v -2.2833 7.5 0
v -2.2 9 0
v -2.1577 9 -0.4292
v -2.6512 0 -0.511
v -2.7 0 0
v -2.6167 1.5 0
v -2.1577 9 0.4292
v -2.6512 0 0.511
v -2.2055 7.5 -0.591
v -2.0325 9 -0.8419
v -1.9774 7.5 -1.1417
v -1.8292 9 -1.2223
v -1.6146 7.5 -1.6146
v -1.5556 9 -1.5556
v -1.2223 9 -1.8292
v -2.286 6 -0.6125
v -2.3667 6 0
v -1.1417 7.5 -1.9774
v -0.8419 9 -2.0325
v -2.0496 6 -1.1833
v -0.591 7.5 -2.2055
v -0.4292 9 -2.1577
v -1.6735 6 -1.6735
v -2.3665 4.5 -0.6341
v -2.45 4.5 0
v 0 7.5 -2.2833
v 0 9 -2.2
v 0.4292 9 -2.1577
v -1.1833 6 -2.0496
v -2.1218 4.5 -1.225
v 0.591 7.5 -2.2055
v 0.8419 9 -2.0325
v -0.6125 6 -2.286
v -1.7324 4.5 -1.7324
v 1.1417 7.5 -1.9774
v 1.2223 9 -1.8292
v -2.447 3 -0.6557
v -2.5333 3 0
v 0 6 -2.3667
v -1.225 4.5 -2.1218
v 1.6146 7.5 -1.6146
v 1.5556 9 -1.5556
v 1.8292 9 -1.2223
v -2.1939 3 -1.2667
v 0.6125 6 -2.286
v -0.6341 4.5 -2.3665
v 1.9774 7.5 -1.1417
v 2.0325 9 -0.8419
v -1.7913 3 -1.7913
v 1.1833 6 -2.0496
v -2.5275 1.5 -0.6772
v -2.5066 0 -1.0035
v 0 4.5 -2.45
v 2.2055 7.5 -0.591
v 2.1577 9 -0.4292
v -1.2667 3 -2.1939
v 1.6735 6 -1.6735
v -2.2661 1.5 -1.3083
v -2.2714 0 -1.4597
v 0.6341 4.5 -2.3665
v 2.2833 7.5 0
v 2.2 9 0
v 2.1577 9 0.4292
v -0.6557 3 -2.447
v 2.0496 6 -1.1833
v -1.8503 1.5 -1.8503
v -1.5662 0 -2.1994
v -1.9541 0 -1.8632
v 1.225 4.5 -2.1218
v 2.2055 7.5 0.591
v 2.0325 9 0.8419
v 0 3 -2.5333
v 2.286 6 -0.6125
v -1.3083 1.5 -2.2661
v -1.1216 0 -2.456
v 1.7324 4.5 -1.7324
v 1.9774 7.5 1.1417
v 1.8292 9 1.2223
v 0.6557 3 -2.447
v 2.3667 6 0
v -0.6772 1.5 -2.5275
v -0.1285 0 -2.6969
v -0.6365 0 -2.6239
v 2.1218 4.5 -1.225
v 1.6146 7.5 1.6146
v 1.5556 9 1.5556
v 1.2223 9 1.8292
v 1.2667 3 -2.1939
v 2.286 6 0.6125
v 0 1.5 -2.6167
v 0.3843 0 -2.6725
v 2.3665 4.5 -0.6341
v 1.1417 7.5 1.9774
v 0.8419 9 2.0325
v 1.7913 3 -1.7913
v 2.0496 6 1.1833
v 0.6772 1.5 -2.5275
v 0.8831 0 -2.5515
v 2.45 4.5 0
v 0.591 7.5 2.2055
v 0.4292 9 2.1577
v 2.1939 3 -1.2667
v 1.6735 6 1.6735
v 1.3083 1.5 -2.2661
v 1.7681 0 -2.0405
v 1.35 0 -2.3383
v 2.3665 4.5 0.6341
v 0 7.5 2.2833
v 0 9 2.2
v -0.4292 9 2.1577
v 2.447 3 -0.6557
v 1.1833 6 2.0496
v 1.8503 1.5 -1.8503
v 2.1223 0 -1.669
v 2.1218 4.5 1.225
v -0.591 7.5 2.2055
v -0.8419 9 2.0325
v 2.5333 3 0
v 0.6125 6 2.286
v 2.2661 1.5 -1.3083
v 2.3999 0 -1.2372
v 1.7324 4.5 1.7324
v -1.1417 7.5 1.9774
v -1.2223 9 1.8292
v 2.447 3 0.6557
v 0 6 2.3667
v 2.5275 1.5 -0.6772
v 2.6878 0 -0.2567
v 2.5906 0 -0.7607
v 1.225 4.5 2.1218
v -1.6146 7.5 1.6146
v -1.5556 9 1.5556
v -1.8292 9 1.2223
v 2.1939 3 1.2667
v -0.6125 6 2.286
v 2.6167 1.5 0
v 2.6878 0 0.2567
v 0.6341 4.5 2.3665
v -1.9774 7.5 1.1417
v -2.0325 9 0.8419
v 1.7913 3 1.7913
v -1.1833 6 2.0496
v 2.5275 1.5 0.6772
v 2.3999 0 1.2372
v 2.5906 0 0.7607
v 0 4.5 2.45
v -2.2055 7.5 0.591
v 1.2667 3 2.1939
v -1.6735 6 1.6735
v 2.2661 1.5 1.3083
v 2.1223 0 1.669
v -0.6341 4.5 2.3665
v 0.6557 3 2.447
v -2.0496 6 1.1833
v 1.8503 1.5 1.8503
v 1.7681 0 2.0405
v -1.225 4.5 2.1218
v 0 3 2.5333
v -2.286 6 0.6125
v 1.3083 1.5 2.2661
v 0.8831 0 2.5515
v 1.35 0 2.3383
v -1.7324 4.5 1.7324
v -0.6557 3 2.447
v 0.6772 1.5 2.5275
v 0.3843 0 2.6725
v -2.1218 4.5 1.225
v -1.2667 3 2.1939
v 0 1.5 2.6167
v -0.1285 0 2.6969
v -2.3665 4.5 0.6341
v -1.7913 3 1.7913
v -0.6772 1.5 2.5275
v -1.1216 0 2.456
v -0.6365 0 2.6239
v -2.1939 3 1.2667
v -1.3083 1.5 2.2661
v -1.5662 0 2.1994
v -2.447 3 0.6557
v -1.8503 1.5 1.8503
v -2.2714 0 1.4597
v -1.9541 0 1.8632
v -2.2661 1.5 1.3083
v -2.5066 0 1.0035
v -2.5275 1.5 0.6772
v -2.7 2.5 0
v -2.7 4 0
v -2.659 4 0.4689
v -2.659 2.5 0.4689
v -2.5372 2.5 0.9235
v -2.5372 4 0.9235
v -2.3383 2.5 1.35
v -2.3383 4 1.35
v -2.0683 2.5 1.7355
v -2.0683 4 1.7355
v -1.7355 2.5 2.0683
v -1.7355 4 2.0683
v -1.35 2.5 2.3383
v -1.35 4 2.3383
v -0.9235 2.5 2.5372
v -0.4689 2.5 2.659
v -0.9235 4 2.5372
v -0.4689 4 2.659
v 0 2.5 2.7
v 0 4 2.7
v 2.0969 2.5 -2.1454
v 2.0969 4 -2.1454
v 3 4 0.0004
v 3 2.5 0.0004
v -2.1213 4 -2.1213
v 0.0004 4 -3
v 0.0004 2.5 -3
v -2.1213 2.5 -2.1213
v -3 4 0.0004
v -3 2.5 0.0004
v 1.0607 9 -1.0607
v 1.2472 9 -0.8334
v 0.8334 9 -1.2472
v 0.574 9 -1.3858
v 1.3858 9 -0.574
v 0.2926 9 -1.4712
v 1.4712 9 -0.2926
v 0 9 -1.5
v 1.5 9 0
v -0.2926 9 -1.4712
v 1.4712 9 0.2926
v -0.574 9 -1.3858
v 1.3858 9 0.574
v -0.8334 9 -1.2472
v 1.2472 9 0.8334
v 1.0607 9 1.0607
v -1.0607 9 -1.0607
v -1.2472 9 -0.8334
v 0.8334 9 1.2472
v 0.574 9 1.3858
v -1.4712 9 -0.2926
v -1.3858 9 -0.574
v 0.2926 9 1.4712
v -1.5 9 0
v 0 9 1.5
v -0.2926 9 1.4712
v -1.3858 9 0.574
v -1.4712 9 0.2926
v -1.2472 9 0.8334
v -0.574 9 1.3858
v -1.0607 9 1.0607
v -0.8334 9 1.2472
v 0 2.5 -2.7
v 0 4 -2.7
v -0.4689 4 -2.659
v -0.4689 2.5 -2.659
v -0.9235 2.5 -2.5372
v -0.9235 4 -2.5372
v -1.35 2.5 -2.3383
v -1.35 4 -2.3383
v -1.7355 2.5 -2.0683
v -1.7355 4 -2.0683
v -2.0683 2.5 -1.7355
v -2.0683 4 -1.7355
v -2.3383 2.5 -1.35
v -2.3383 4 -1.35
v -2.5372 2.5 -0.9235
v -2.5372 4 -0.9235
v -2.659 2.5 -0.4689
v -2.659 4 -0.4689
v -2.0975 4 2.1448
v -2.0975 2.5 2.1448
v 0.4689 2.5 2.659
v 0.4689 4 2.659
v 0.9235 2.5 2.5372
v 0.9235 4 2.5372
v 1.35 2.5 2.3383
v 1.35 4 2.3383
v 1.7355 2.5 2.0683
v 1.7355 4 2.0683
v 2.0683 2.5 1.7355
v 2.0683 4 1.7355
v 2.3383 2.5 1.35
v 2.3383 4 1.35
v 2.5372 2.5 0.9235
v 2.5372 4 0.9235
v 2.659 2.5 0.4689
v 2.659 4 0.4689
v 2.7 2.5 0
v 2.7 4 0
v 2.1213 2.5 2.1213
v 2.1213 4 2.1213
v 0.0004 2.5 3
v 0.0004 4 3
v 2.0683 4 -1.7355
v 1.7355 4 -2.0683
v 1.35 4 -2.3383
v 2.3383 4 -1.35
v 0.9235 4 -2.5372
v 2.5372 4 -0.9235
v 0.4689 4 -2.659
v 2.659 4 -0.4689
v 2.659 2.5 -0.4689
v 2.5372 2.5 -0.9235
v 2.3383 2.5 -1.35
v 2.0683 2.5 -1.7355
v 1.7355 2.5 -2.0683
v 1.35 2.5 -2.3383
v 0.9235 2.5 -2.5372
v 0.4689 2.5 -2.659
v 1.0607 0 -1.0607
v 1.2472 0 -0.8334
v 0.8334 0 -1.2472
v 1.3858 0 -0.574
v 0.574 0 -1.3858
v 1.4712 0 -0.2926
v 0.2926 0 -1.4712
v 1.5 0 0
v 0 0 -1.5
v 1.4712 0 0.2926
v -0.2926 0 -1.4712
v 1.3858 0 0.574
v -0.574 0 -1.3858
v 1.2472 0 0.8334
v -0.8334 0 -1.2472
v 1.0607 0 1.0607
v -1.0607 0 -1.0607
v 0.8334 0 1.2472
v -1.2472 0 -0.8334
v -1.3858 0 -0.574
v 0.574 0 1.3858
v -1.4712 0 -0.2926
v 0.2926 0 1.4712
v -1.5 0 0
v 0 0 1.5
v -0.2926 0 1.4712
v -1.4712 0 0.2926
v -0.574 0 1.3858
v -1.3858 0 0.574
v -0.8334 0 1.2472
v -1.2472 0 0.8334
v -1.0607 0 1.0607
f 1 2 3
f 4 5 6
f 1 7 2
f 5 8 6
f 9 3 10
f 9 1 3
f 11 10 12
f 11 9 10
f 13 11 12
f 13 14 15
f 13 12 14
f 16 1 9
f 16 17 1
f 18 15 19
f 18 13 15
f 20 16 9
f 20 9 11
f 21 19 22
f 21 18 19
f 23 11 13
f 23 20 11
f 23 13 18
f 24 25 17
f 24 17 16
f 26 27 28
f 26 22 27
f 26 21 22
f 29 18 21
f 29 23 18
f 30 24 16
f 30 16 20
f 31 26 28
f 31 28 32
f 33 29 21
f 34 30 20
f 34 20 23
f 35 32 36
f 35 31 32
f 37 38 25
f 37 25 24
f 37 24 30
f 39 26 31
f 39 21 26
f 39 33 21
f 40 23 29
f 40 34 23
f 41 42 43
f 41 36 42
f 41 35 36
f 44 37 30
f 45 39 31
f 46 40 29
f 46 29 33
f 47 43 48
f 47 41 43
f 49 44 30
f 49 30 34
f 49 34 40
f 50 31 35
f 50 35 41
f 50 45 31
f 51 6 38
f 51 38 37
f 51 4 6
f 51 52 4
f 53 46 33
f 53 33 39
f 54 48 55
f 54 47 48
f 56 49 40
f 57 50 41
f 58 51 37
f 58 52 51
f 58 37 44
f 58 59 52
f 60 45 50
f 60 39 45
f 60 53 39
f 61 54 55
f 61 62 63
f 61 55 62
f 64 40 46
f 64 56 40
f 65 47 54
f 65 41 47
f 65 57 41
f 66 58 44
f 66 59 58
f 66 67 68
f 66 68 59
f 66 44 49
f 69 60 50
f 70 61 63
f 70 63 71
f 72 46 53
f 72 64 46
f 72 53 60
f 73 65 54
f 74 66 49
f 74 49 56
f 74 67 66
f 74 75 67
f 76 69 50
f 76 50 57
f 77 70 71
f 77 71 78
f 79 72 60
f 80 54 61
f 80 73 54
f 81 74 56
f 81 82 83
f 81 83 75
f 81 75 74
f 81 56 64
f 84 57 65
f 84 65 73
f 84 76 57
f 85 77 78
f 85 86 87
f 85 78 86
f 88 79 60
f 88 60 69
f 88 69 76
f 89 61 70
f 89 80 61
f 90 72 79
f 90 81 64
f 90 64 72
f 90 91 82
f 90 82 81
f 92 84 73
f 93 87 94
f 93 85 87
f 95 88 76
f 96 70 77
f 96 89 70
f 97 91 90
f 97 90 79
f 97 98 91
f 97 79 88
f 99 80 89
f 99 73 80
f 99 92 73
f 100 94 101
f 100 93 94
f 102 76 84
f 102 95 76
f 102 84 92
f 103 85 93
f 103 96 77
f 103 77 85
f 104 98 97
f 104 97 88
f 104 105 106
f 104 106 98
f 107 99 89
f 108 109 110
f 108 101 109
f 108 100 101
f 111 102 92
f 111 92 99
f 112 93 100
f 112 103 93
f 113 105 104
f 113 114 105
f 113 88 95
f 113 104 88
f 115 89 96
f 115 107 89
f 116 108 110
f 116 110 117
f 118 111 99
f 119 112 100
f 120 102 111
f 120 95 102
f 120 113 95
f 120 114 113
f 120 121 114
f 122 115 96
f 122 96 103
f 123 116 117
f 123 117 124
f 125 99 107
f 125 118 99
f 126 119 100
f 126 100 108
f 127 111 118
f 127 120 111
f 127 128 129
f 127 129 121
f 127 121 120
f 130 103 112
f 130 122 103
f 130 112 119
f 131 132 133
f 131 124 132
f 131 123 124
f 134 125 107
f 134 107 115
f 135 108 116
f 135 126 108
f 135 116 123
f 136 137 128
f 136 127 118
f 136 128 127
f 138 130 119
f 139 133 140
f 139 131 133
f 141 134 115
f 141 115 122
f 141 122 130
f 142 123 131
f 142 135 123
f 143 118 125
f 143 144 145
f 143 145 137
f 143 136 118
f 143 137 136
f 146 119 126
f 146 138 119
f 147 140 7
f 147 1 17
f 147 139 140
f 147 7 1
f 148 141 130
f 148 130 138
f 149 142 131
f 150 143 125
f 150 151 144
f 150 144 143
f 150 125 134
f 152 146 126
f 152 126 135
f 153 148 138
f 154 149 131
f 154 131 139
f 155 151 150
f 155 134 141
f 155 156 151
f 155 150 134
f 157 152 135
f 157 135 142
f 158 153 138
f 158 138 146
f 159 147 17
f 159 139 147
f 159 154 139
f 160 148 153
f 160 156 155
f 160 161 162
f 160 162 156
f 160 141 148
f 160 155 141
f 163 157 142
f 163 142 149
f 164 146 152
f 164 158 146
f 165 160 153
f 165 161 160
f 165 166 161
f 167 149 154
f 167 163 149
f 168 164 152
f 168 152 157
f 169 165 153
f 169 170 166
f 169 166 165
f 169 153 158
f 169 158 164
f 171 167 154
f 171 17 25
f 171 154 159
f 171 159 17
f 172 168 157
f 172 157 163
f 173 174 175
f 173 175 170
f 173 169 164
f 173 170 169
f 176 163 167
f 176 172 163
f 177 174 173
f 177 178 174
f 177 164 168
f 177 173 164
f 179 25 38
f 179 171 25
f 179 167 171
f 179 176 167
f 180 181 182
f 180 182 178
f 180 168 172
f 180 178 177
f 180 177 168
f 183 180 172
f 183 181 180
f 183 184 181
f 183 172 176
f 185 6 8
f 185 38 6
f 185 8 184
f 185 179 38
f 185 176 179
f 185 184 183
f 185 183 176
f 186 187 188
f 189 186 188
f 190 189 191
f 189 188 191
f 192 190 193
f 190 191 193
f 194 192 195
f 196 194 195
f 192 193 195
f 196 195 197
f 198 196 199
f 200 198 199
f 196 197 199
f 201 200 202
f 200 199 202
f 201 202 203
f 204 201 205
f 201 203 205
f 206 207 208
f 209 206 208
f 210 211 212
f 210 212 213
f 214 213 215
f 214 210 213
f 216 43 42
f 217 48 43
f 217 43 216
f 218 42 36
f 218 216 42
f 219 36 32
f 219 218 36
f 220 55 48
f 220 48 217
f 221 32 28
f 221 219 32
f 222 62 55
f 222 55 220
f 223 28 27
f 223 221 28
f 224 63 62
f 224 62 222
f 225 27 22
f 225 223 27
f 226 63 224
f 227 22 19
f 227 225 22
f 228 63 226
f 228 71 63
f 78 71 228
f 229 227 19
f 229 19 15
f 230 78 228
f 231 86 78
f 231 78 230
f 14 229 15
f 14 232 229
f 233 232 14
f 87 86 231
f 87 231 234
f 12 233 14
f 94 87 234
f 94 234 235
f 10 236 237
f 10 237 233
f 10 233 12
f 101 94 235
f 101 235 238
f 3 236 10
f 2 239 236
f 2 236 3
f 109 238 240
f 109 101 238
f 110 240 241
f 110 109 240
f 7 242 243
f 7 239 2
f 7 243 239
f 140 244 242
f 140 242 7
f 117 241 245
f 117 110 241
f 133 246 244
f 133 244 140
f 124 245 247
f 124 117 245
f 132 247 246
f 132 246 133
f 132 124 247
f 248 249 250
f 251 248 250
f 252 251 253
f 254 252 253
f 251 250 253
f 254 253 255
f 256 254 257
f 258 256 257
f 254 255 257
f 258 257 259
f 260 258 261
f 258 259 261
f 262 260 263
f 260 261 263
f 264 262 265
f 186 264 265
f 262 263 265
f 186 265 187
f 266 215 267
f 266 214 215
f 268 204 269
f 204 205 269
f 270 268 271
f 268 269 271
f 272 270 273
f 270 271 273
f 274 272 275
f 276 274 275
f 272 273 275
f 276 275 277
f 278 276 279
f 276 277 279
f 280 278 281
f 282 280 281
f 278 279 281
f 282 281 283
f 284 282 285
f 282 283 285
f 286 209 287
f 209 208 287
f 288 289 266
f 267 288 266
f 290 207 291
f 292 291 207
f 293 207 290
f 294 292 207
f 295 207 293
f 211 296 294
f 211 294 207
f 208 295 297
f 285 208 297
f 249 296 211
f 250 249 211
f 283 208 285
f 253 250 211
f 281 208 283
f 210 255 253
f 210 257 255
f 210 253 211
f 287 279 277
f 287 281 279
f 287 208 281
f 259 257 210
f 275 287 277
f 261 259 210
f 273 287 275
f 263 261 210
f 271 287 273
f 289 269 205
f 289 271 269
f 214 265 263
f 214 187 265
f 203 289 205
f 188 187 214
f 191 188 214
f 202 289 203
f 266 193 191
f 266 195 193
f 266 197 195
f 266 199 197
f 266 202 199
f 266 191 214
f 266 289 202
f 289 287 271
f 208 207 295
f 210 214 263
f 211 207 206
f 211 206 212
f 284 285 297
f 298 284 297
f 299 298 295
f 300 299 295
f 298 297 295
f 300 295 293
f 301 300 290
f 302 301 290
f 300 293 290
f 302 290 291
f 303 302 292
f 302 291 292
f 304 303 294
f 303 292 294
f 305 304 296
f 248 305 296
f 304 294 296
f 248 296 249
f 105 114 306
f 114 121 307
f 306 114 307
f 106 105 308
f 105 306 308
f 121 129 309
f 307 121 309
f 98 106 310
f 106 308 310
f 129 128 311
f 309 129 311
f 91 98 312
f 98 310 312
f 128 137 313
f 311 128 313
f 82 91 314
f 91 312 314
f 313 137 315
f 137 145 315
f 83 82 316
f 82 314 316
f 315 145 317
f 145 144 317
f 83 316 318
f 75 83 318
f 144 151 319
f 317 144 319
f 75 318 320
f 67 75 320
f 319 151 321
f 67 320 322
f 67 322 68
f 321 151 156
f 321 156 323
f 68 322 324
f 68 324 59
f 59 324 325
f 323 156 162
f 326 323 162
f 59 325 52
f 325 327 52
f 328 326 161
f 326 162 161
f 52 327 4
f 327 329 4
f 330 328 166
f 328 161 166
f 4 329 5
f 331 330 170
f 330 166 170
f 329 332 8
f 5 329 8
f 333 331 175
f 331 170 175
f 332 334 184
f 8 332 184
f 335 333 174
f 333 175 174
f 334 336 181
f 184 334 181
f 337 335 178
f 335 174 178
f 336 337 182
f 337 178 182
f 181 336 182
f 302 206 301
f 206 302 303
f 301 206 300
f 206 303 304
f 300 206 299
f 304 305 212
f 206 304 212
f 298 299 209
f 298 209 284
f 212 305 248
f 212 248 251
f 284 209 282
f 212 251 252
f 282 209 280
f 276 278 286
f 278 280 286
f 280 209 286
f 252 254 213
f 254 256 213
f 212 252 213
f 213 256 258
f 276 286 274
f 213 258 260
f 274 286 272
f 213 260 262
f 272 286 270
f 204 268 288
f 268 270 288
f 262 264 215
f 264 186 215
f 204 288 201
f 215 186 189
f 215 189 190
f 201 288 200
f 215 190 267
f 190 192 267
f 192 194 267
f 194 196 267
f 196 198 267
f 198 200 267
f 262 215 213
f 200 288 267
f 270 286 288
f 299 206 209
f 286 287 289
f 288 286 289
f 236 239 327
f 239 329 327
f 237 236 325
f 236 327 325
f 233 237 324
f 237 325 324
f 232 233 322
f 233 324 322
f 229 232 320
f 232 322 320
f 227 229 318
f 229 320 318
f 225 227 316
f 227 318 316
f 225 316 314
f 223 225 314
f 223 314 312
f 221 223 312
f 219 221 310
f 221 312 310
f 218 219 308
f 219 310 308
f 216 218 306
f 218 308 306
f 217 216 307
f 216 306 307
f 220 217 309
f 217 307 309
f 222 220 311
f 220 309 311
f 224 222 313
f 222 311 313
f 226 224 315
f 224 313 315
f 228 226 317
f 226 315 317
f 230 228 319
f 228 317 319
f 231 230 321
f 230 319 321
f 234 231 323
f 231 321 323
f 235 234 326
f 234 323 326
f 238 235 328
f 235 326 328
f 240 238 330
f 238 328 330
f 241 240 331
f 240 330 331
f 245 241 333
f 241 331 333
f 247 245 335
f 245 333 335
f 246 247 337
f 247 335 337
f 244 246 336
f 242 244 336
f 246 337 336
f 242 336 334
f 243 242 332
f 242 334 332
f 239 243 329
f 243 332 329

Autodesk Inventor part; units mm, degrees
ref_plane "YZ Plane" through (0, 0, 0) normal (1, 0, 0) x (0, 1, 0)
sketch "Boceto1" plane through (0, 0, 0) normal (0, 1, 0) x (-1, 0, 0)
  circle A0 centre (0, 0) radius 2.7
  circle A1 centre (0, 0) radius 1.5
  dimension "d0" = 5.4
  dimension "d1" = 3
ref_plane "Plano de trabajo1" through (0, 9, 0) normal (0, 1, 0) x (-1, 0, 0)
sketch "Boceto2" plane through (0, 9, 0) normal (0, 1, 0) x (-1, 0, 0)
  circle A0 centre (0, 0) radius 1.5
  circle A1 centre (0, 0) radius 2.2
  dimension "d3" = 3
  dimension "d4" = 4.4
sketch "Boceto3" plane through (0, 0, 0) normal (0, 0, 1) x (1, 0, 0)
  point P0 (0, 0)
loft "Solevación1" add profiles "Boceto1", "Boceto2" contours A0 | A1 / A0 | A1
sketch "Boceto4" plane through (0, 0, 0) normal (0, 1, 0) x (-1, 0, 0)
  circle A0 centre (0, 0) radius 1.5
  dimension "d10" = 3
extrude "Extrusión1" cut sketch "Boceto4" along normal blind 10
ref_plane "Plano de trabajo2" through (0, 4, 0) normal (0, 1, 0) x (-1, 0, 0)
sketch "Boceto5" plane through (0, 4, 0) normal (0, 1, 0) x (-1, 0, 0)
  line L0 (-3, 0.0004) -> (1, 0.0004) construction
  circle A0 centre (0, 0) radius 2.7 projected
  line L1 (0, 2.7) -> (-2.7, 0)
  line L2 (0, -2.7) -> (-2.7, 0)
  line L3 (0, -2.7) -> (2.7, 0)
  line L4 (2.7, 0) -> (0, 2.7)
  line L5 (3.2285, -3.2285) -> (7.2285, -3.2285) construction
  line L6 (2.1213, -2.1213) -> (3, 0.0004)
  line L7 (3, 0.0004) -> (2.0975, 2.1448)
  line L8 (-2.0969, -2.1454) -> (-3, 0.0004)
  line L9 (-3, 0.0004) -> (-2.1213, 2.1213)
  line L10 (-0.0004, -3) -> (2.1213, -2.1213)
  line L11 (-2.0969, -2.1454) -> (-0.0004, -3)
  line L12 (-2.1213, 2.1213) -> (-0.0004, 3)
  line L13 (-0.0004, 3) -> (2.0975, 2.1448)
  circle A1 centre (0, 0) radius 1.5
  dimension "d33" = 3
extrude "Extrusión2" add sketch "Boceto5" against normal blind 1.5 contours L10 L11 L8 L9 L12 L13 L7 L6
properties part number "Tuerca_Conica"
